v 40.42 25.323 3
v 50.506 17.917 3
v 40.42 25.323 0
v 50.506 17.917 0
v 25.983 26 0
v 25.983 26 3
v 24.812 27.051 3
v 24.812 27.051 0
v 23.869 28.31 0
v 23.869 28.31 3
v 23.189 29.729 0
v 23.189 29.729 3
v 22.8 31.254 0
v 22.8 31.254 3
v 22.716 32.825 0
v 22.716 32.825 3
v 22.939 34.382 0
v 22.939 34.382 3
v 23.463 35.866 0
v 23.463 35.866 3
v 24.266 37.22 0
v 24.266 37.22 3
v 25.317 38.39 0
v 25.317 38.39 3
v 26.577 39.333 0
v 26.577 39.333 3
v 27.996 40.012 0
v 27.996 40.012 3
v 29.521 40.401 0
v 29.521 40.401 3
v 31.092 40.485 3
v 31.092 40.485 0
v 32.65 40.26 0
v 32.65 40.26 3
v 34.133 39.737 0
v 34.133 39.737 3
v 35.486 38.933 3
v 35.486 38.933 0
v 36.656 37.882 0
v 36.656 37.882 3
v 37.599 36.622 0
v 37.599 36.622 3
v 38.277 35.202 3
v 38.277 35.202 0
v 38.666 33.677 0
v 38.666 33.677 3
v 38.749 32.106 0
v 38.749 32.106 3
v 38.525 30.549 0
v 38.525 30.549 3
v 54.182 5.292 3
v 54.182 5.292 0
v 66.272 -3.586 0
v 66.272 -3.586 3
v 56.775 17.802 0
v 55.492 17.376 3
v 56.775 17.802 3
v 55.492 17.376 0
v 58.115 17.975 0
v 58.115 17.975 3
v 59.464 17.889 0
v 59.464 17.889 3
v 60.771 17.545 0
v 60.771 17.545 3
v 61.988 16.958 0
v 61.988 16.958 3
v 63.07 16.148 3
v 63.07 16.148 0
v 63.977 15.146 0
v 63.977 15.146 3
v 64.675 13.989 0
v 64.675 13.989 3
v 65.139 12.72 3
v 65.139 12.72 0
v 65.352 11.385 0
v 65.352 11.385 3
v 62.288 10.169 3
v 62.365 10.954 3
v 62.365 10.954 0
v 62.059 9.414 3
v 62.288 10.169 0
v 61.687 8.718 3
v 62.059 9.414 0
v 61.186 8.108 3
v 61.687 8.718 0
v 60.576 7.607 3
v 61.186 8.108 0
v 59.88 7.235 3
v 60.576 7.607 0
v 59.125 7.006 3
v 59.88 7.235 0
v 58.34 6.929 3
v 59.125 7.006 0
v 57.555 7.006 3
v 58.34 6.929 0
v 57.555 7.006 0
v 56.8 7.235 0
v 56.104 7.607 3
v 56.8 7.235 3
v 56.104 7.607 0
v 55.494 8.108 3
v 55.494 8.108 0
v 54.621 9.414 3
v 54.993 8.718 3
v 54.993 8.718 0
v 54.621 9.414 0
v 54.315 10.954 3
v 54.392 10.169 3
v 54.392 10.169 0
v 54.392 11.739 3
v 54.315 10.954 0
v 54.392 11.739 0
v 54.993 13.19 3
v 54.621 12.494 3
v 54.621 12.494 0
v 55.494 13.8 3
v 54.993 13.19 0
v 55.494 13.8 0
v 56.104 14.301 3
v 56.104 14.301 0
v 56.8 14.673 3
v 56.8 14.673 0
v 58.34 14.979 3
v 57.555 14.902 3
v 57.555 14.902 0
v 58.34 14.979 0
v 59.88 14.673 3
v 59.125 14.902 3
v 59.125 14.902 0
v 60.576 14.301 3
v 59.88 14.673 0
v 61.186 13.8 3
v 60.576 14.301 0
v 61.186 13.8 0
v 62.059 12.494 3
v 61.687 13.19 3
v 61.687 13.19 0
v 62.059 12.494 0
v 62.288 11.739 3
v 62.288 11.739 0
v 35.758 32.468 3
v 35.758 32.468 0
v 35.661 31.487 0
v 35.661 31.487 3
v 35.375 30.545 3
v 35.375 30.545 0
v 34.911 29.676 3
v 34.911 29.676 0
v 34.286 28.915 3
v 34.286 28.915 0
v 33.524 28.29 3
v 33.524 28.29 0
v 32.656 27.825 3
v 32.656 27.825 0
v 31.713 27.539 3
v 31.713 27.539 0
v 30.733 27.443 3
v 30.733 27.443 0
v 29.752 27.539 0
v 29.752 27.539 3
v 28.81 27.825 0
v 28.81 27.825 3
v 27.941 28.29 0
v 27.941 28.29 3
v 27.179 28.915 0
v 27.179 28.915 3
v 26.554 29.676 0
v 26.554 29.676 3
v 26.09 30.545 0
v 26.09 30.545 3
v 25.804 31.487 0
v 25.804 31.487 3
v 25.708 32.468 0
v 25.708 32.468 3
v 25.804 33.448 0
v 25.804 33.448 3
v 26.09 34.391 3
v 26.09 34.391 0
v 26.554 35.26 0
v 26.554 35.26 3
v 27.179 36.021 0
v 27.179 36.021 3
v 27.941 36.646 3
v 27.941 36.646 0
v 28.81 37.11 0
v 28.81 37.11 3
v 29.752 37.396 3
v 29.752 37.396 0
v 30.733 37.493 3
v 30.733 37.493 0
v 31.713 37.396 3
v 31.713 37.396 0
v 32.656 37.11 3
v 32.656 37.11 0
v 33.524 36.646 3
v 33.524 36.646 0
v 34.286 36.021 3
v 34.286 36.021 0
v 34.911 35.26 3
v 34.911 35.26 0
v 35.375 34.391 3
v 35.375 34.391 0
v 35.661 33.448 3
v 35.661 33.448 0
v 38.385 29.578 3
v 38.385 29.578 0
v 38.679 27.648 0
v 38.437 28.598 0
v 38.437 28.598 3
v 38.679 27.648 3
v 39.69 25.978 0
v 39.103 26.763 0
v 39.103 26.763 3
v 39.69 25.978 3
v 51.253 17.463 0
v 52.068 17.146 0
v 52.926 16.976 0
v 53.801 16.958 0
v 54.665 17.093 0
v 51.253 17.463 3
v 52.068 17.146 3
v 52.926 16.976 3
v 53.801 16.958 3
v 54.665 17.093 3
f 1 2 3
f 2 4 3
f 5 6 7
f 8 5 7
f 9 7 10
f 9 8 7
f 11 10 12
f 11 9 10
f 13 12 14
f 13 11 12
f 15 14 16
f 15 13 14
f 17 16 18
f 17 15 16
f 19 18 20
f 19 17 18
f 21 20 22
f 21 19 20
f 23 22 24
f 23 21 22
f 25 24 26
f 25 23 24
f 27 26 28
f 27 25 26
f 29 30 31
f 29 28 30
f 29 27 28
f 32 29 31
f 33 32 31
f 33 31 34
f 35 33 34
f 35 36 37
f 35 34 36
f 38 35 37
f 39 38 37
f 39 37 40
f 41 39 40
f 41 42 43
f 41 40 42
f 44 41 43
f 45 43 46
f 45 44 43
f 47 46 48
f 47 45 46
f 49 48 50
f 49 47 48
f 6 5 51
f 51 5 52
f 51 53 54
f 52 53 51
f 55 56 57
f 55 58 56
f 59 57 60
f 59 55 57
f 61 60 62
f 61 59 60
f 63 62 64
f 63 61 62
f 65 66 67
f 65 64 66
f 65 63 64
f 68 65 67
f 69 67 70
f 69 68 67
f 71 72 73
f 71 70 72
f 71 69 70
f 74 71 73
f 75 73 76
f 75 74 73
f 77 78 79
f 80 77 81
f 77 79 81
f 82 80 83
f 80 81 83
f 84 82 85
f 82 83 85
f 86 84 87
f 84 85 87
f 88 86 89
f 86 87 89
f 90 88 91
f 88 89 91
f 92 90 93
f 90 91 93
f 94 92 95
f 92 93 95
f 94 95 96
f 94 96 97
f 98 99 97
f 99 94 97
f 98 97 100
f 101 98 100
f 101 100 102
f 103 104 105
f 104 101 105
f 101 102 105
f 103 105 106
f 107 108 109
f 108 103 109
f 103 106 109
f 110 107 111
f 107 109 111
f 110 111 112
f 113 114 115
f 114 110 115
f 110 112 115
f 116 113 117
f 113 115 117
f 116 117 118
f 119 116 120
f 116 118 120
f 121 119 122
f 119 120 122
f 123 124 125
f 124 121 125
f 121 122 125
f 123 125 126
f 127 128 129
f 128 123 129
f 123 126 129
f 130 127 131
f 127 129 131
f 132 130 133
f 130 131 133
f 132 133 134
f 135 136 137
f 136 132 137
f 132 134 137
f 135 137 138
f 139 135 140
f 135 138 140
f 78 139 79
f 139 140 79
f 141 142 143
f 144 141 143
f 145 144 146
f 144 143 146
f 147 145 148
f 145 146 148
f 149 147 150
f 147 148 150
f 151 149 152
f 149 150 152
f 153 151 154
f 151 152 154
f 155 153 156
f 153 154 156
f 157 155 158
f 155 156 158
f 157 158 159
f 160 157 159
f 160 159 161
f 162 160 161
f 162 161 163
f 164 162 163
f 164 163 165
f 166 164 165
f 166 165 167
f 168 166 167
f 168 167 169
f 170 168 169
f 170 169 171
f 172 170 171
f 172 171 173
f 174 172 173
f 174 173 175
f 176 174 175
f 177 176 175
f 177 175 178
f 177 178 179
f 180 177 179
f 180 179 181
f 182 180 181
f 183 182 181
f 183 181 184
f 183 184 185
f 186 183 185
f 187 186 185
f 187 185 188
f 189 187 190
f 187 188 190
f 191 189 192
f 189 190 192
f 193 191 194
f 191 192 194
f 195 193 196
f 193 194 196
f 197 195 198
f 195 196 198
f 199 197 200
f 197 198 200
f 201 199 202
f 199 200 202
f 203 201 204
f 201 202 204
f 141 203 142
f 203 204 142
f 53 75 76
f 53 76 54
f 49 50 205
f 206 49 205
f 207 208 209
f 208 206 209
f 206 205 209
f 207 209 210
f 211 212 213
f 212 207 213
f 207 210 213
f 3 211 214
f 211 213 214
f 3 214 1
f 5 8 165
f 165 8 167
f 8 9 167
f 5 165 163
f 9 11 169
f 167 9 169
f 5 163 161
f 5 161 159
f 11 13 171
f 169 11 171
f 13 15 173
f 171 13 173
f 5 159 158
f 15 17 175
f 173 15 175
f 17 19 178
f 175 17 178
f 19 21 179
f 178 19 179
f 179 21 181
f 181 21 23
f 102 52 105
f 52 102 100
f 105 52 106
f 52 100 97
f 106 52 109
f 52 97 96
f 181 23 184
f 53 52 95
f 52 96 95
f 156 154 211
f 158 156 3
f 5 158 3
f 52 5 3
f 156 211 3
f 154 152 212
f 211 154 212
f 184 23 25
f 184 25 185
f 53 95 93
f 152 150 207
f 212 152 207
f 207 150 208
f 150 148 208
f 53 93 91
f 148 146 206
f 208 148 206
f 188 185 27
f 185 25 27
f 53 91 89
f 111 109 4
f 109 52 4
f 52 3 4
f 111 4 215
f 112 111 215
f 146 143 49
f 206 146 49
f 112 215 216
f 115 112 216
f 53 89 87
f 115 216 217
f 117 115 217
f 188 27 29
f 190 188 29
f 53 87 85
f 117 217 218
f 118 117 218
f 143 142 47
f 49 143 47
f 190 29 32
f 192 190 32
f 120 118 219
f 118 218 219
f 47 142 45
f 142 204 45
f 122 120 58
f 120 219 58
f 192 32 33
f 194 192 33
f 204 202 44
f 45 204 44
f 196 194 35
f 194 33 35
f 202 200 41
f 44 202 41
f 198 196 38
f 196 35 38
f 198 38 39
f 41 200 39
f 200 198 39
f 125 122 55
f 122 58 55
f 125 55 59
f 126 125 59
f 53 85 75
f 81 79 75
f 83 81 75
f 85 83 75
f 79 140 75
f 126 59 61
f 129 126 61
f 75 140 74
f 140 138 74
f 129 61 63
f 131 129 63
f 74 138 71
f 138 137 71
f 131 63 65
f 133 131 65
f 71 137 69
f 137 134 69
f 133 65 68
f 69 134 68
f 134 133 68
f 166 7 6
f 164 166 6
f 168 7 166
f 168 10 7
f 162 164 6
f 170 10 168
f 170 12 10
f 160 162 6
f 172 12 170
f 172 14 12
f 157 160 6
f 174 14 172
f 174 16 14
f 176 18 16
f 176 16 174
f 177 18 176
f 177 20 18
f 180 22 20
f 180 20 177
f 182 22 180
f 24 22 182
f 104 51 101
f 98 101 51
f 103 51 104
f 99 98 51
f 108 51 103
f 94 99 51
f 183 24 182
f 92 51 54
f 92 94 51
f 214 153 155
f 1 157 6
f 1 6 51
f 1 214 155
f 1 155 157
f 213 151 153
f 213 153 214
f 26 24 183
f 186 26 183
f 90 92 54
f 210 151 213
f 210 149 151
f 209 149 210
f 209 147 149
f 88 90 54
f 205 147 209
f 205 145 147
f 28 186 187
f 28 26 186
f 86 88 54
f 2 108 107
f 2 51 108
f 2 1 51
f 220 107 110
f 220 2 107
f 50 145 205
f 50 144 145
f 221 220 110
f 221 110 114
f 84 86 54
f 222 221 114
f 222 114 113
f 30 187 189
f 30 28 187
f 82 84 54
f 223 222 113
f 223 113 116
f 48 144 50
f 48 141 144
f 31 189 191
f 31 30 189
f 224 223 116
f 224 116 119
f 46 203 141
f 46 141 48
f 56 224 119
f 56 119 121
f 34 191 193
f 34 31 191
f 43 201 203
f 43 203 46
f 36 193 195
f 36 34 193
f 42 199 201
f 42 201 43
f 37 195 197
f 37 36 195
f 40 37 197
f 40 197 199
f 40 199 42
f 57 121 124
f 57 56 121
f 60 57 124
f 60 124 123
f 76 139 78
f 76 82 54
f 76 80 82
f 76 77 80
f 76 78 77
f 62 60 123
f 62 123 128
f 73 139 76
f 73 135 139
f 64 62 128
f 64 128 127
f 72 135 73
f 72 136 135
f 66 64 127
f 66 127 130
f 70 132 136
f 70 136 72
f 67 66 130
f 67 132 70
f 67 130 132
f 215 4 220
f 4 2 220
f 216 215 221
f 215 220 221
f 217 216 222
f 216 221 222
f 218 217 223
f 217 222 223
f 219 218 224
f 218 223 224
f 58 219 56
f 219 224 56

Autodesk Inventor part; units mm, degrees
ref_plane "YZ Plane" through (0, 0, 0) normal (1, 0, 0) x (0, 1, 0)
ref_plane "XZ Plane" through (0, 0, 0) normal (0, 1, 0) x (-1, 0, 0)
ref_plane "XY Plane" through (0, 0, 0) normal (0, 0, 1) x (1, 0, 0)
sketch "スケッチ1" plane through (0, 0, 0) normal (0, 0, 1) x (1, 0, 0)
  line L0 (-170.6512, -31.4118) -> (202.8656, -31.4118) construction
  circle A0 centre (-14, -17.4118) radius 14 construction
  circle A1 centre (14, -17.4118) radius 14 construction
  circle A2 centre (-28.0204, 0.0121) radius 20.05 construction
  circle A3 centre (-28.0204, 0.0121) radius 5.05 construction
  circle A4 centre (8.8763, 3.8907) radius 32.05 construction
  circle A5 centre (8.8763, 3.8907) radius 10.1 construction
  circle A6 centre (54.047, 13.5882) radius 36.1 construction
  line L1 (-170.915, -81.4118) -> (490.0044, -81.4118)
  circle A7 centre (-28.0204, 0.0121) radius 22.342 construction
  circle A8 centre (-39.4931, 19.1835) radius 14 construction
  circle A9 centre (-49.0547, 7.5438) radius 14 construction
  circle A10 centre (-49.0547, -7.5196) radius 14 construction
  circle A11 centre (-39.4931, -19.1593) radius 14 construction
  circle A12 centre (8.8763, 3.8907) radius 33.05 construction
  circle A13 centre (54.047, 13.5882) radius 38.1 construction
  line L2 (-11.5565, -29.1593) -> (4.2969, -29.1593) construction
  line L3 (-67.2952, 44.8622) -> (-67.2952, -57.3934) construction
  line L4 (-149.4523, -1.6098) -> (-132.6633, -31.6026)
  line L5 (-132.7701, -31.4118) -> (-132.7701, 74.0456)
  circle A14 centre (-11.4931, -19.1593) radius 14 construction
  line L6 (-197.2268, -33.1593) -> (179.6604, -33.1593) construction
  circle A15 centre (54.047, 13.5882) radius 4.025
  circle A16 centre (54.047, 13.5882) radius 6
  circle A17 centre (-39.4931, 19.1835) radius 5
  circle A18 centre (-49.0547, 7.5438) radius 5
  circle A19 centre (-49.0547, -7.5196) radius 5
  circle A20 centre (-39.4931, -19.1593) radius 5
  circle A21 centre (-39.4931, 19.1835) radius 8 construction
  circle A22 centre (-49.0547, 7.5438) radius 8 construction
  circle A23 centre (-49.0547, -7.5196) radius 8 construction
  circle A24 centre (-39.4931, -19.1593) radius 8 construction
  circle A25 centre (-28.0204, 0.0121) radius 4.5
  circle A26 centre (8.8763, 3.8907) radius 7.5
  line L7 (-17.5497, 32.3149) -> (-46.3578, 15.0755) construction
  line L8 (-46.3578, 15.0755) -> (-51.7515, 0.0121) construction
  line L9 (-51.7515, 0.0121) -> (-46.3578, -15.0513) construction
  line L10 (-46.3578, -15.0513) -> (-37.9391, -20.0892) construction
  circle A27 centre (-32.6283, 23.2915) radius 1.3
  circle A28 centre (-46.3578, 15.0755) radius 1.3
  circle A29 centre (-51.7515, 0.0121) radius 1.3
  circle A30 centre (-46.3578, -15.0513) radius 1.3
  circle A31 centre (-32.6283, -23.2673) radius 1.3
  line L11 (-67.2952, 23.1796) -> (-67.2952, -18.1327)
  arc A32 (79.2003, -37.212) -> (87.3507, -31.2711) centre (80.4159, -30.3183) ccw
  arc A33 (8.1864, 50.8943) -> (0.9804, 51.9708) centre (3.7003, 45.5208) ccw
  line L12 (-52.2685, -33.1593) -> (56.2168, -33.1593)
  line L13 (56.2168, -33.1593) -> (79.2003, -37.212)
  arc A34 (92.7831, 8.2659) -> (29.742, 44.2162) centre (54.047, 13.5882) ccw
  line L14 (87.3507, -31.2711) -> (92.7831, 8.2659)
  line L15 (0.9804, 51.9708) -> (-67.2952, 23.1796)
  circle A35 centre (34.0114, -24.0061) radius 4.5 construction
  circle A36 centre (34.0114, -24.0061) radius 1.5
  circle A37 centre (-21.4477, 26.0369) radius 4.5 construction
  circle A38 centre (-21.4477, 26.0369) radius 1.5
  circle A39 centre (-56.0504, 23.0377) radius 1.5
  circle A40 centre (-56.0504, 23.0377) radius 3 construction
  circle A41 centre (-56.0504, 23.0377) radius 4.5 construction
  circle A42 centre (-64.2952, 0.0121) radius 1.5
  circle A43 centre (-64.2952, 0.0121) radius 3 construction
  circle A44 centre (-64.2952, 0.0121) radius 4.3311 construction
  line L16 (54.047, 13.5882) -> (99.37, -7.5264)
  line L17 (99.37, -7.5264) -> (58.3399, 10.9541)
  line L18 (58.3399, 10.9541) -> (30.7326, 32.4678)
  line L19 (30.7326, 32.4678) -> (54.047, 13.5882)
  line L20 (99.37, -7.5264) -> (491.4359, -184.1173)
  line L21 (-183.2789, 162.2213) -> (-183.2789, -125.2315)
  line L22 (516.7211, 155.5913) -> (516.7211, -155.5644)
  circle A45 centre (99.37, -7.5264) radius 7.25
  line L23 (135.8413, -23.9534) -> (383.826, -192.7834) construction
  line L24 (218.8627, -80.4751) -> (224.047, -10.6673) construction
  circle A46 centre (3.7003, 45.5208) radius 4
  circle A47 centre (122.1646, -17.7933) radius 2
  circle A48 centre (135.8413, -23.9534) radius 2
  arc A49 (134.404, -28.7424) -> (138.4753, -19.7035) centre (135.8413, -23.9534) ccw
  line L25 (134.404, -28.7424) -> (96.4236, -17.3438)
  line L26 (138.4753, -19.7035) -> (104.7697, 1.1861)
  circle A50 centre (30.7326, 32.4678) radius 2
  circle A51 centre (-16.1798, -24.0771) radius 4.5 construction
  circle A52 centre (-16.1798, -24.0771) radius 1.5
  line L27 (-67.2952, -18.1327) -> (-52.2685, -33.1593)
  circle A53 centre (-56.0504, -23.0135) radius 1.5
  circle A54 centre (-56.0504, -23.0135) radius 3 construction
  circle A55 centre (30.7326, 32.4678) radius 4
  arc A56 (56.8403, 15.6972) -> (51.3644, 11.3402) centre (54.047, 13.5882) ccw
  line L28 (96.4916, -6.1854) -> (101.9705, -5.7041) construction
  line L29 (101.9705, -5.7041) -> (99.6479, -10.6896) construction
  line L30 (99.6479, -10.6896) -> (96.4916, -6.1854) construction
  circle A57 centre (99.6479, -10.6896) radius 1.5
  circle A58 centre (101.9705, -5.7041) radius 1.5
  circle A59 centre (96.4916, -6.1854) radius 1.5
  circle A60 centre (99.37, -7.5264) radius 6
  arc A61 (97.7876, -15.8778) -> (97.5111, 0.7679) centre (99.37, -7.5264) ccw
  arc A62 (56.8403, 15.6972) -> (97.5111, 0.7679) centre (88.7632, 39.7996) ccw
  arc A63 (51.3644, 11.3402) -> (97.7876, -15.8778) centre (112.6811, 62.7237) ccw
  circle A64 centre (54.047, 13.5882) radius 8.5
  line L31 (102.9595, 0.1786) -> (57.6365, 21.2931)
  line L32 (50.4575, 5.8833) -> (95.7806, -15.2313)
  circle A65 centre (12.7384, 41.2415) radius 3 construction
  circle A66 centre (12.7384, 41.2415) radius 4.5 construction
  circle A67 centre (12.7384, 41.2415) radius 1.5
  circle A68 centre (80.4159, -30.3183) radius 4
  circle A69 centre (69.7531, -26.0108) radius 1.5
  circle A70 centre (69.7531, -26.0108) radius 4.5 construction
  circle A71 centre (-56.0504, -23.0135) radius 4.5 construction
  line L33 (8.1864, 50.8943) -> (15.9809, 44.3871)
  arc A72 (15.9809, 44.3871) -> (29.742, 44.2162) centre (22.9664, 52.7545) ccw
  circle A73 centre (-5.4761, 38.5895) radius 1.5
  circle A74 centre (-5.4761, 38.5895) radius 4.5 construction
  circle A75 centre (54.047, 13.5882) radius 50 construction
  circle A76 centre (3.7003, 45.5208) radius 2
  circle A77 centre (80.4159, -30.3183) radius 2
  circle A78 centre (54.047, 13.5882) radius 1.5 construction
  circle A79 centre (58.3399, 10.9541) radius 1.5
  circle A80 centre (58.3399, 10.9541) radius 3
  circle A81 centre (58.3399, 10.9541) radius 5
  line L34 (94.099, -16.3172) -> (55.7687, 6.6659)
  line L35 (59.8474, 15.7214) -> (102.4604, 2.2467)
  arc A82 (104.7697, 1.1861) -> (102.4604, 2.2467) centre (99.37, -7.5264) ccw
  arc A83 (94.099, -16.3172) -> (96.4236, -17.3438) centre (99.37, -7.5264) ccw
  circle A84 centre (30.7326, 32.4678) radius 5.025
  circle A85 centre (30.7326, 32.4678) radius 8.025
  circle A86 centre (58.3399, 10.9541) radius 4.025
  circle A87 centre (58.3399, 10.9541) radius 7.025
  line L36 (25.9827, 25.9995) -> (54.1819, 5.2918)
  line L37 (53.3095, 15.8577) -> (37.1861, 27.6978)
  line L38 (65.3516, 11.3852) -> (66.2721, -3.5865)
  line L39 (66.2721, -3.5865) -> (54.1819, 5.2918)
  point P0 (0, 0)
  point P1 (0, 0)
  point P2 (-49.0547, 7.5438)
  point P3 (-49.0547, -7.5196)
  dimension "d88" = 100
  dimension "d0" = 40.1
  dimension "d1" = 10.1
  dimension "d2" = 64.1
  dimension "d3" = 20.2
  dimension "d4" = 72.2
  dimension "d5" = 95
  dimension "d6" = 44.684
  dimension "d7" = 28
  dimension "d8" = 28
  dimension "d9" = 28
  dimension "d10" = 28
  dimension "d11" = 1
  dimension "d12" = 2
  dimension "d13" = 4
  dimension "d14" = 8.05
  dimension "d15" = 12
  dimension "d16" = 10
  dimension "d17" = 10
  dimension "d18" = 10
  dimension "d19" = 10
  dimension "d20" = 3
  dimension "d21" = 3
  dimension "d22" = 3
  dimension "d23" = 3
  dimension "d24" = 9
  dimension "d25" = 15
  dimension "d26" = 2.6
  dimension "d27" = 2.6
  dimension "d28" = 2.6
  dimension "d29" = 2.6
  dimension "d30" = 2.6
  dimension "d31" = 1
  dimension "d32" = 9
  dimension "d33" = 3
  dimension "d34" = 9
  dimension "d35" = 3
  dimension "d36" = 3
  dimension "d37" = 6
  dimension "d38" = 9
  dimension "d39" = 3
  dimension "d40" = 6
  dimension "d41" = 50
  dimension "d42" = 45
  dimension "d43" = 35
  dimension "d44" = 30
  dimension "d45" = 39
  dimension "d46" = 430
  dimension "d47" = 700
  dimension "d48" = 14.5
  dimension "d49" = 300
  dimension "d50" = 10
  dimension "d51" = 70
  dimension "d52" = 120
  dimension "d53" = 140
  dimension "d54" = 8
  dimension "d55" = 4
  dimension "d56" = 4
  dimension "d57" = 15
  dimension "d58" = 25
  dimension "d59" = 10
  dimension "d60" = 4
  dimension "d61" = 9
  dimension "d62" = 3
  dimension "d63" = 3
extrude "押し出し1" add sketch "スケッチ1" along normal blind 3 contours A86 A62 A56 A81 A15 | A15 A81 A16 A86 | A86 L18 A81 A56 A62 | A86 L16 A81 L18 | A81 A56 A87 A15 | A15 A87 A16 A81 | A16 A81 A64 A86 | A81 L16 L19 A87 L18 | L18 A87 A56 A81 | A86 A15 A81 L16 | A16 A87 A64 L35 A81 | A64 A81 L16 A62 A86 | A87 L19 A56 L18 | L18 A56 L37 A87 | A81 A15 A63 A56 A87 L19 L16 | A86 A16 A63 A81 A15 | L37 A56 L18 A15 | A15 L18 A16 L37 | L35 A64 A81 | A62 L16 A86 | A56 L19 A15 L18 | A87 A56 L19 | A81 A63 A15 | A86 A64 A81 A63 A16 | A15 L19 A16 L18 | A16 L18 A64 L37 | A87 L35 A64 | A64 L35 A87 L16 A81 | A62 A81 L17 A86 L16 | L16 A81 A62 | A56 A87 A15 L19 | A56 A63 A15 A87 | A63 A81 A16 A87 A15 | A63 A16 A81 | A63 A81 A16 | A86 L17 A81 A64 | A15 A87 A16 L19 | A16 L19 A64 L18 | A64 L18 A85 L37 | L16 A87 L17 A62 A81 | A62 L17 A81 | A81 A63 A64 A87 A16 | A81 L34 A64 A63 | A81 L17 A62 A87 L34 A64 | A64 L34 A81 | A16 A87 L36 A64 L19 | A64 L19 A85 L18 | A85 L18 A84 L19 | L38 L16 A87 | L16 L38 L17 A87 | L17 A87 A62 | A64 L34 A87 A63 | A63 A87 A64 | A64 L36 A85 L19 | A85 L19 A84 L18 | L17 L38 A62 A87 | A62 L38 L34 A87 | A87 A64 L39 | A87 L34 L38 L32 A63 | A63 L32 L39 A64 A87 | L32 L38 A63 | A63 L38 L39 L32
fillet "フィレット1" radius 5 2 edges at (37.1861, 27.6978, 1.5) (53.3095, 15.8577, 1.5)
properties part number "アーム揺動節" material "アルミニウム 7075"
